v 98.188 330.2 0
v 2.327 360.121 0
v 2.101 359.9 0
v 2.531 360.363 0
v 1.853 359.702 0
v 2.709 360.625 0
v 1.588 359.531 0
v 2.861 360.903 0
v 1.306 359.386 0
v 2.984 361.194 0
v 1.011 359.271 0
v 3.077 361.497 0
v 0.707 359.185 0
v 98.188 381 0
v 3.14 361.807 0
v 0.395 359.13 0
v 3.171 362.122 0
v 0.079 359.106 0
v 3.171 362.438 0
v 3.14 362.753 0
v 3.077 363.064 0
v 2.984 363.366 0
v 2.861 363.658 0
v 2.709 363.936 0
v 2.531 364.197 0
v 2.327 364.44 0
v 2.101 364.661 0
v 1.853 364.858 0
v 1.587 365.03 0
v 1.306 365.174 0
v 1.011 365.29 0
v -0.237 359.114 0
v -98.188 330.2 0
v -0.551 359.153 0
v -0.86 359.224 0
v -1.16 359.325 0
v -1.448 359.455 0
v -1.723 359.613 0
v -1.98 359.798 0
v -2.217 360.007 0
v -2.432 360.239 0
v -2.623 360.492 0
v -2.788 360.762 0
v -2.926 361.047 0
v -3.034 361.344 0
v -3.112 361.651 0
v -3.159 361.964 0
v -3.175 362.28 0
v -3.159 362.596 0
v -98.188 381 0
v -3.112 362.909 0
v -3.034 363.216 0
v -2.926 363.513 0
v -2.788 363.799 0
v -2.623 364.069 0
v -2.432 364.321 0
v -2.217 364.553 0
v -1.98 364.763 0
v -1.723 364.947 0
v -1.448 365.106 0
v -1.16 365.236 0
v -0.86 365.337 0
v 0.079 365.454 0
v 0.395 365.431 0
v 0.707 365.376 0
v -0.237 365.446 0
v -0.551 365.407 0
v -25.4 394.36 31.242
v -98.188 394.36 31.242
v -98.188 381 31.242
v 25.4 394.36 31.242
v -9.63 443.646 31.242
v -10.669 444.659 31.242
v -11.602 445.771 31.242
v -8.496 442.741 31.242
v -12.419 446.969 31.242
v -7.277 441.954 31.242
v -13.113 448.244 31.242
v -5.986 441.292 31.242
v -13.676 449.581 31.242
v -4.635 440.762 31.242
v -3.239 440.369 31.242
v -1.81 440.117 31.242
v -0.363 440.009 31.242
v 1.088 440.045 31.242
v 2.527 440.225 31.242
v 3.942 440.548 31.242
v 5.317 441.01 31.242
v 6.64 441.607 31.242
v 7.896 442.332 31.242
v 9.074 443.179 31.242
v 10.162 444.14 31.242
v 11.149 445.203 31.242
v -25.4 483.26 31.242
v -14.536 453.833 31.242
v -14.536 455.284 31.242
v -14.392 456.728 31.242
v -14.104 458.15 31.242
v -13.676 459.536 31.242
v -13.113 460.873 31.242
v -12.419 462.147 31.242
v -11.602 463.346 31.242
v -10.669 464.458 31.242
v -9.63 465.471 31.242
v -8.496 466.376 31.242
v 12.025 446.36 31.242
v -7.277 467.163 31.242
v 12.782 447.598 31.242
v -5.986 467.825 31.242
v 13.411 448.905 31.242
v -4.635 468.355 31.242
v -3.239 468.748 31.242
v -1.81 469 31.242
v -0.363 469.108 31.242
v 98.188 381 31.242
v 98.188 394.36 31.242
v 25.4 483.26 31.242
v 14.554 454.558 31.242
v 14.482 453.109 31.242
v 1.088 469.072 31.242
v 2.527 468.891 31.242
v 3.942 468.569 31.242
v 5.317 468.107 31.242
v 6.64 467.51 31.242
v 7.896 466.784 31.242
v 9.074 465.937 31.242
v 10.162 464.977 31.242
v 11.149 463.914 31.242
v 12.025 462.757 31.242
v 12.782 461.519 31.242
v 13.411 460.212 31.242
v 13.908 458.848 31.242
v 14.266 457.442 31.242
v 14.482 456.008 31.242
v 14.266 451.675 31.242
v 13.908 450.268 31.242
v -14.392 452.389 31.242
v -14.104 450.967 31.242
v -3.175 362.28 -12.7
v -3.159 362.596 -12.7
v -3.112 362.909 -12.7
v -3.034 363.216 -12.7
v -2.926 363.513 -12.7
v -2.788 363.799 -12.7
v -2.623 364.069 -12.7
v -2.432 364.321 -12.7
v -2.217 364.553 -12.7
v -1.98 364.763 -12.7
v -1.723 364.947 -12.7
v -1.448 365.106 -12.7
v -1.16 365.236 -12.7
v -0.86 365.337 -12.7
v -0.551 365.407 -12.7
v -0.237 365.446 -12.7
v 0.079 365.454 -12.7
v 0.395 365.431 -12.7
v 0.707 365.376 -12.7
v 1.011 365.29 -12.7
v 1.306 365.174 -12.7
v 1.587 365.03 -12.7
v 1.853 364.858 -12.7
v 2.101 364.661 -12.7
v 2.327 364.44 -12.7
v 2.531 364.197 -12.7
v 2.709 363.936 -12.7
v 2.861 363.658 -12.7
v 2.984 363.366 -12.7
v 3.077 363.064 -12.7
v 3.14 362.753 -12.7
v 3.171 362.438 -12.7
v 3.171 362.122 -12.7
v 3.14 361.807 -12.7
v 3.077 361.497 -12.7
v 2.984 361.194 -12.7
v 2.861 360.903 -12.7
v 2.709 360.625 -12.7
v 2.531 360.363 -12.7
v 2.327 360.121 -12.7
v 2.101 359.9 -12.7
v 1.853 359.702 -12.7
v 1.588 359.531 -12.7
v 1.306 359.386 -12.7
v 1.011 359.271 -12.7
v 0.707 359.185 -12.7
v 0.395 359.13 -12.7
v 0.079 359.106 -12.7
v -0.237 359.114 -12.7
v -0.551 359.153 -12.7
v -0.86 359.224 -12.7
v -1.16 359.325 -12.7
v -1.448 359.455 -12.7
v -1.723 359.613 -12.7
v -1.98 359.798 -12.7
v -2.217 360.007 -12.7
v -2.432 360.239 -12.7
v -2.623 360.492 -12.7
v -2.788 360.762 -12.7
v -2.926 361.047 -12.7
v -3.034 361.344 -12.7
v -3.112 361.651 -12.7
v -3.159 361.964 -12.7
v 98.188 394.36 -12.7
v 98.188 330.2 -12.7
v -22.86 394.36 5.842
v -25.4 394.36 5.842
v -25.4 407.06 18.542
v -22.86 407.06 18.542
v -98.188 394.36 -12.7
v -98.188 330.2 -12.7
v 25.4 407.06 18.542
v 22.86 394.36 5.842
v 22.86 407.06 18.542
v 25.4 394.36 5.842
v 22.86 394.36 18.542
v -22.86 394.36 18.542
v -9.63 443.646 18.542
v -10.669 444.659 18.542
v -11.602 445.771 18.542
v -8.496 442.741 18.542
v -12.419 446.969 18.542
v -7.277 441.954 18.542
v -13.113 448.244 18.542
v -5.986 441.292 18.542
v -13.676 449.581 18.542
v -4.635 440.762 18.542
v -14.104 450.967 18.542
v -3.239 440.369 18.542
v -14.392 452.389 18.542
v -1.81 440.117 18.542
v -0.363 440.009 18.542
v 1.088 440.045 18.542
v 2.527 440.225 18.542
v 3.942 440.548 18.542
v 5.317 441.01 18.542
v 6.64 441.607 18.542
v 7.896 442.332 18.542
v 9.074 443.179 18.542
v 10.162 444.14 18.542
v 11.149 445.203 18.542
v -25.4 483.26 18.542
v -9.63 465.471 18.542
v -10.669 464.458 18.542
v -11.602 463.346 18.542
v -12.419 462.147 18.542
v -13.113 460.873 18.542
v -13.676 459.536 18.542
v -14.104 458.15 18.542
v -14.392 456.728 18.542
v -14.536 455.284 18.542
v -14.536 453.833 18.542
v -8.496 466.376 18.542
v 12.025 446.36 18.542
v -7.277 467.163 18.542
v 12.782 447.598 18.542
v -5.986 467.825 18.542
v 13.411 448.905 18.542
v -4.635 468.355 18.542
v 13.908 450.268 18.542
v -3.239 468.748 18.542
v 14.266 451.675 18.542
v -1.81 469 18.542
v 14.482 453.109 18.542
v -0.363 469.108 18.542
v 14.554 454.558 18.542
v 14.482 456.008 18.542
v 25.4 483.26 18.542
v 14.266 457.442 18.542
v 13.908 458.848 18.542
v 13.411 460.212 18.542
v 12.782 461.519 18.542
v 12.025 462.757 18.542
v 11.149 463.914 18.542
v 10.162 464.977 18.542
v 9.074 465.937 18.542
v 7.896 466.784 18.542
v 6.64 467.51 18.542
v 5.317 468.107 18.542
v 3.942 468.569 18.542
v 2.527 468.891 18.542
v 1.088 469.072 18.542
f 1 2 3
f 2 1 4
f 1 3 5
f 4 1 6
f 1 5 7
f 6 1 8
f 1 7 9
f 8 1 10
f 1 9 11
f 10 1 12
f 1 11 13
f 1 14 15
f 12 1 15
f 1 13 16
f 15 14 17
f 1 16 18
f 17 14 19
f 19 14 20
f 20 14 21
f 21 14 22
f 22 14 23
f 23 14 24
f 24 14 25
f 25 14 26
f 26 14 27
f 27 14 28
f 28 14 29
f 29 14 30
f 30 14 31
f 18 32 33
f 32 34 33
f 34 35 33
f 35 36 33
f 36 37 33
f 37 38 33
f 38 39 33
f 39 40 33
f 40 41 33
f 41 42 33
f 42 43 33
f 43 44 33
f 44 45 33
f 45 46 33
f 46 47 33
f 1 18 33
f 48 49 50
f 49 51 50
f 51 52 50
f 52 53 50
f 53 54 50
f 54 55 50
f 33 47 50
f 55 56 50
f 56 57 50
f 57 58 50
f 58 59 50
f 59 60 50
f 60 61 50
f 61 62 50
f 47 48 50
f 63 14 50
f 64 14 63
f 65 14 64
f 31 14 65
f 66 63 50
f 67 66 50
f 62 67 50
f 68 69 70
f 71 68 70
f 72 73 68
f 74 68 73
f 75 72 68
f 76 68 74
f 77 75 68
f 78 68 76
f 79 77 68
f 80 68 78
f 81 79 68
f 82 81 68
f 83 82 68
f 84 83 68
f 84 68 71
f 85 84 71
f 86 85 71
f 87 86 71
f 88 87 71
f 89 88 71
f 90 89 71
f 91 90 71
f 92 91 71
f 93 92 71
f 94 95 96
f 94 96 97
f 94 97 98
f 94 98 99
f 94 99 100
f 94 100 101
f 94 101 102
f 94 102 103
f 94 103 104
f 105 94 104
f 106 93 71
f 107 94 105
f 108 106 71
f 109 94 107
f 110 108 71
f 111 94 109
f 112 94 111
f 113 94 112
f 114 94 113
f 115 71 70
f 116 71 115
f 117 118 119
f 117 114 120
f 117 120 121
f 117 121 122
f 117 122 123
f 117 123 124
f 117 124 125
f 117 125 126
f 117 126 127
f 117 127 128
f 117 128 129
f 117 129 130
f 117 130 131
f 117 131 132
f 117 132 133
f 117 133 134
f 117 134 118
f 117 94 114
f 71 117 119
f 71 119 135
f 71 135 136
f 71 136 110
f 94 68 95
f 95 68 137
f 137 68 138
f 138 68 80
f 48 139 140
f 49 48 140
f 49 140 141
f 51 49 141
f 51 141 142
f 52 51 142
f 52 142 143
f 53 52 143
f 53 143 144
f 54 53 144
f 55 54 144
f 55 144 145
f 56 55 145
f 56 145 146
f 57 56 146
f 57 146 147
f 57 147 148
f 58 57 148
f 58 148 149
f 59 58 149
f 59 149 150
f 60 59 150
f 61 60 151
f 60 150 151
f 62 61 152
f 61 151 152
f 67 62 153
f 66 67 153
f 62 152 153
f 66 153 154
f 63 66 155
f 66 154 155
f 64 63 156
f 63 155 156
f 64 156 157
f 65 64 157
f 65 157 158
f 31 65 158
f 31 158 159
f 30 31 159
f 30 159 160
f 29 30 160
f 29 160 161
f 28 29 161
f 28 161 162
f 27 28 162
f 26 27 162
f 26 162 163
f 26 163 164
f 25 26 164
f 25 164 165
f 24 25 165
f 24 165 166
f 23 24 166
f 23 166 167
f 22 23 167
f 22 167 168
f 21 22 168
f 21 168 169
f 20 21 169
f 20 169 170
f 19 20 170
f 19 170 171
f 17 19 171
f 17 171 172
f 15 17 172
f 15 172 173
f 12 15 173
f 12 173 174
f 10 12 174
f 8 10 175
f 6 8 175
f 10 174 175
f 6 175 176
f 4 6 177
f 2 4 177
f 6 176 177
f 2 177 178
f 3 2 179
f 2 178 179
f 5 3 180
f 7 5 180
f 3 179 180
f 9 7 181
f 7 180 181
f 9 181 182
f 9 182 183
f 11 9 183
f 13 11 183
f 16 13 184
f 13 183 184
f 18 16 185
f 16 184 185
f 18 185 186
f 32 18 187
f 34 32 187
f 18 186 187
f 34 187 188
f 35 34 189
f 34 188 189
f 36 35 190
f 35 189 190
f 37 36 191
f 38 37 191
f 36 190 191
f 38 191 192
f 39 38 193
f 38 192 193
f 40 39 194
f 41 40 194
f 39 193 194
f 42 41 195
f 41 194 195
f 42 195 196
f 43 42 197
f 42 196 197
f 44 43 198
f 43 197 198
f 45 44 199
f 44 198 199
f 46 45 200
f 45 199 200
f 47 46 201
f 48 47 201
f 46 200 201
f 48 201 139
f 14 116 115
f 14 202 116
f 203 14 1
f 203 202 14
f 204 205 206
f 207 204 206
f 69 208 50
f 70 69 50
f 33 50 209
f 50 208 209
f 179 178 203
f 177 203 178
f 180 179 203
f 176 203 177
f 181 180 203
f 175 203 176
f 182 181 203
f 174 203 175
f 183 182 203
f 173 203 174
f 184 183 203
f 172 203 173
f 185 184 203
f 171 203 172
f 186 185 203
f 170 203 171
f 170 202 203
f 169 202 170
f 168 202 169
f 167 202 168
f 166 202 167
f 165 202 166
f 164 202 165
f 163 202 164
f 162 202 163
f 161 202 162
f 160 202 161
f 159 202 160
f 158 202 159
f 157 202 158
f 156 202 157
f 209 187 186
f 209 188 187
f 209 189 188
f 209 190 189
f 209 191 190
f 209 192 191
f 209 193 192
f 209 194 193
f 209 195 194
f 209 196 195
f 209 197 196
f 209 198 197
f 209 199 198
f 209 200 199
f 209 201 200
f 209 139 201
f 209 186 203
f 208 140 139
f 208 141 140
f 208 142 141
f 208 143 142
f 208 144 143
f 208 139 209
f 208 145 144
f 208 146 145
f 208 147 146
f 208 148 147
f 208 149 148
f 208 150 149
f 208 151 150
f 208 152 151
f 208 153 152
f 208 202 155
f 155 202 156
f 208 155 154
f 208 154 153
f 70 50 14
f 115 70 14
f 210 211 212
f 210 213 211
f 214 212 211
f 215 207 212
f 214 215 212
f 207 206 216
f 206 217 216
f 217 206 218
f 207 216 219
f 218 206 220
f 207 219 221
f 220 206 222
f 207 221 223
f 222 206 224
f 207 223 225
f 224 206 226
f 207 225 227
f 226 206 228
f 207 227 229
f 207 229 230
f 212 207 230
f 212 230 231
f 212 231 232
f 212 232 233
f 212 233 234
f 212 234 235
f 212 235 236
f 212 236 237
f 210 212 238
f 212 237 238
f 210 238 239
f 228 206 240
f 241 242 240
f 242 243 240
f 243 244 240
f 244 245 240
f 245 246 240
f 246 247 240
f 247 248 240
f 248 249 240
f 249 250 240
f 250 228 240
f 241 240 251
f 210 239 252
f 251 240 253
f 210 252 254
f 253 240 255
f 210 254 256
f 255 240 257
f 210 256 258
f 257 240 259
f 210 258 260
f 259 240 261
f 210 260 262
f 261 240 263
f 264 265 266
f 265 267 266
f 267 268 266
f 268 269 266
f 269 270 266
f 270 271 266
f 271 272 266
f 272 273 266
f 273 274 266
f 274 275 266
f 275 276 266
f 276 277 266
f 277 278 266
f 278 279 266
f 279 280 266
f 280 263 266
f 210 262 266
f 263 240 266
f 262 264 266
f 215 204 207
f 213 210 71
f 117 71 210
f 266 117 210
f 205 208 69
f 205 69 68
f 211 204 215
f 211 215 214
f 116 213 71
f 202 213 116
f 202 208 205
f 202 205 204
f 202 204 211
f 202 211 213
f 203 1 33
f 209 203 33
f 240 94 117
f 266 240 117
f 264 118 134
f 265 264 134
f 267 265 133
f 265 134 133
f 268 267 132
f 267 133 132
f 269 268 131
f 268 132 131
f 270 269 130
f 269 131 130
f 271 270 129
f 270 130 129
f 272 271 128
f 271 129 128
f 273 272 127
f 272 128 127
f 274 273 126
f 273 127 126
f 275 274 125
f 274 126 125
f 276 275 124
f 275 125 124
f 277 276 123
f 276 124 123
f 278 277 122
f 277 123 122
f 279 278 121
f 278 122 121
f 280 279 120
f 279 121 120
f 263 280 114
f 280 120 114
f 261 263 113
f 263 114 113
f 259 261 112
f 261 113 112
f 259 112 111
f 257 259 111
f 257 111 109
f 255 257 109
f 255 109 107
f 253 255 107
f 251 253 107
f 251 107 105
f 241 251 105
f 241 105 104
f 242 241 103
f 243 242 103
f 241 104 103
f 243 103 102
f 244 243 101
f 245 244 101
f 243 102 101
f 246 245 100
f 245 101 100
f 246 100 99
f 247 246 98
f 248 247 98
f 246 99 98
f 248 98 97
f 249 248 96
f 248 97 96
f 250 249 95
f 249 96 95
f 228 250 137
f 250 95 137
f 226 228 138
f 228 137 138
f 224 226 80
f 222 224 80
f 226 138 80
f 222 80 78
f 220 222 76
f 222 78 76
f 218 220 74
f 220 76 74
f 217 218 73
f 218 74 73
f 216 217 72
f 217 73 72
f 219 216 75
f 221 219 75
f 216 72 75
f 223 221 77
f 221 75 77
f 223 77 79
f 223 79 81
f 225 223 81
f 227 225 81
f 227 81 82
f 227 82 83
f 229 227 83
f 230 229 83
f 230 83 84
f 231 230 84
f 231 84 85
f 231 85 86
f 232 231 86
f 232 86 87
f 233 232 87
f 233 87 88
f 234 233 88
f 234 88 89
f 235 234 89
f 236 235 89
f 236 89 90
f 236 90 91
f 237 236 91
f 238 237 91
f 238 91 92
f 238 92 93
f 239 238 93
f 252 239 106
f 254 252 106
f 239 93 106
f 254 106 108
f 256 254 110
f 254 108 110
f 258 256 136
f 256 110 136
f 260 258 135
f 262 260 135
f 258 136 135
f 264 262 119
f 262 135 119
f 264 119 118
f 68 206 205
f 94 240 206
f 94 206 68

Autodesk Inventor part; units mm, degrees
ref_plane "YZ Plane" through (0, 0, 0) normal (1, 0, 0) x (0, 1, 0)
ref_plane "XZ Plane" through (0, 0, 0) normal (0, 1, 0) x (-1, 0, 0)
ref_plane "XY Plane" through (0, 0, 0) normal (0, 0, 1) x (1, 0, 0)
sketch "Sketch2" plane through (0, 0, 0) normal (0, 0, 1) x (1, 0, 0)
  circle A0 centre (0, 0) radius 406.4
  line L0 (-704.85, -381) -> (704.85, -381)
  line L1 (704.85, -381) -> (704.85, 381)
  line L2 (-704.85, 381) -> (-704.85, -381)
  line L3 (-704.85, -381) -> (704.85, 381) construction
  line L4 (704.85, -381) -> (-704.85, 381) construction
  line L5 (0, 381) -> (-98.1878, 381)
  line L6 (0, 394.3604) -> (-98.1878, 394.3604)
  line L7 (-98.1878, 394.3604) -> (-98.1878, 381)
  line L8 (0, 394.3604) -> (98.1878, 394.3604)
  line L9 (98.1878, 394.3604) -> (98.1878, 381)
  line L10 (-98.1878, 381) -> (98.1878, 381)
  line L11 (-98.1878, 381) -> (98.1878, 381)
  line L12 (-98.1878, 394.3604) -> (98.1878, 394.3604)
  line L13 (98.1878, 394.3604) -> (98.1878, 381)
  line L14 (-98.1878, 394.3604) -> (-98.1878, 381)
  line L15 (-141.4212, 381) -> (-704.85, 381)
  line L16 (704.85, 381) -> (141.4212, 381)
  line L17 (98.1878, 381) -> (-98.1878, 381)
  dimension "d0" = 812.8
  dimension "d1" = 1409.7
  dimension "d2" = 762
  dimension "d9" = 394.3604
extrude "Extrusion1" add sketch "Sketch2" along normal blind 31.242 contours L9 L10 L5 L7 L6 L8
sketch "Sketch4" plane through (0, 0, 31.242) normal (0, 0, 1) x (1, 0, 0)
  circle A0 centre (0, 0) radius 406.4
  line L0 (98.1878, 394.3604) -> (-98.1878, 394.3604) projected
  circle A1 centre (0, 454.5584) radius 14.5542
  line L1 (25.4, 394.3604) -> (-25.4, 394.3604)
  line L2 (-25.4, 394.3604) -> (-25.4, 483.2604)
  line L3 (-25.4, 483.2604) -> (25.4, 483.2604)
  line L4 (25.4, 483.2604) -> (25.4, 394.3604)
  line L5 (0, 0) -> (0, 517.5127)
  arc A2 (25.4, 410.5643) -> (-25.4, 410.5643) centre (0, 454.5584) ccw
  line L6 (-98.1878, 381) -> (98.1878, 381) projected
  dimension "d10" = 812.8
  dimension "d12" = 60.198
  dimension "d13" = 29.1084
  dimension "d14" = 50.8
  dimension "d15" = 88.9
  dimension "d16" = 25.4
  dimension "d27" = 13.3604
  dimension "d28" = 50.8
extrude "Extrusion2" add sketch "Sketch4" against normal blind 12.7 contours L4 L0 L5 A0 | A0 L5 A1 L3 L4 | L2 L3 L5 A1 A0 | A0 L5 L0 L2
sketch "Sketch7" plane through (0, 0, 0) normal (0, 0, -1) x (-1, 0, 0)
  line L0 (98.1878, 394.3604) -> (98.1878, 381) projected
  line L1 (98.1878, 394.3604) -> (-98.1878, 394.3604)
  line L2 (-98.1878, 394.3604) -> (-98.1878, 330.2)
  line L3 (-98.1878, 330.2) -> (98.1878, 330.2)
  line L4 (98.1878, 330.2) -> (98.1878, 394.3604)
  line L5 (98.1878, 381) -> (-98.1878, 381) projected
  point P0 (0, 0)
  dimension "d23" = 50.8
  dimension "d24" = 64.1604
extrude "Extrusion5" add sketch "Sketch7" along normal blind 12.7
sketch "Sketch8" plane through (0, 0, -12.7) normal (0, 0, -1) x (-1, 0, 0)
  line L0 (98.1878, 394.3604) -> (-98.1878, 394.3604) projected
  circle A0 centre (0, 362.2802) radius 3.175
  point P0 (0, 0)
  dimension "d31" = 6.35
extrude "Extrusion6" cut sketch "Sketch8" against normal blind 12.7
thread "Thread1" size "1/4-20 UNC" class "2B" standard "ANSI Unified Screw Threads" full length
sketch "Sketch9" plane through (-25.4, 394.3604, 31.242) normal (-1, 0, 0) x (0, 0, 1)
  line L0 (0, 88.9) -> (-12.7, 88.9) projected
  line L1 (-12.7, 88.9) -> (-12.7, 0) projected
  line L2 (-12.7, 12.7) -> (-12.7, 0)
  line L3 (-12.7, 0) -> (-25.4, 0)
  line L4 (-43.942, 0) -> (0, 0) projected
  line L5 (-25.4, 0) -> (-12.7, 12.7)
  point P0 (-31.242, -394.3604)
  dimension "d36" = 12.7
  dimension "d37" = 45
extrude "Extrusion7" add sketch "Sketch9" against normal blind 2.54
sketch "Sketch10" plane through (25.4, 394.3604, 31.242) normal (1, 0, 0) x (0, 0, -1)
  line L0 (25.4, 0) -> (12.7, 0) projected
  line L1 (25.4, 0) -> (12.7, 12.7) projected
  line L2 (12.7, 0) -> (12.7, 12.7)
  line L3 (12.7, 12.7) -> (25.4, 0)
  line L4 (25.4, 0) -> (12.7, 0)
  point P0 (31.242, -394.3604)
extrude "Extrusion8" add sketch "Sketch10" against normal blind 2.54
properties part number "NewNewMechanism"
